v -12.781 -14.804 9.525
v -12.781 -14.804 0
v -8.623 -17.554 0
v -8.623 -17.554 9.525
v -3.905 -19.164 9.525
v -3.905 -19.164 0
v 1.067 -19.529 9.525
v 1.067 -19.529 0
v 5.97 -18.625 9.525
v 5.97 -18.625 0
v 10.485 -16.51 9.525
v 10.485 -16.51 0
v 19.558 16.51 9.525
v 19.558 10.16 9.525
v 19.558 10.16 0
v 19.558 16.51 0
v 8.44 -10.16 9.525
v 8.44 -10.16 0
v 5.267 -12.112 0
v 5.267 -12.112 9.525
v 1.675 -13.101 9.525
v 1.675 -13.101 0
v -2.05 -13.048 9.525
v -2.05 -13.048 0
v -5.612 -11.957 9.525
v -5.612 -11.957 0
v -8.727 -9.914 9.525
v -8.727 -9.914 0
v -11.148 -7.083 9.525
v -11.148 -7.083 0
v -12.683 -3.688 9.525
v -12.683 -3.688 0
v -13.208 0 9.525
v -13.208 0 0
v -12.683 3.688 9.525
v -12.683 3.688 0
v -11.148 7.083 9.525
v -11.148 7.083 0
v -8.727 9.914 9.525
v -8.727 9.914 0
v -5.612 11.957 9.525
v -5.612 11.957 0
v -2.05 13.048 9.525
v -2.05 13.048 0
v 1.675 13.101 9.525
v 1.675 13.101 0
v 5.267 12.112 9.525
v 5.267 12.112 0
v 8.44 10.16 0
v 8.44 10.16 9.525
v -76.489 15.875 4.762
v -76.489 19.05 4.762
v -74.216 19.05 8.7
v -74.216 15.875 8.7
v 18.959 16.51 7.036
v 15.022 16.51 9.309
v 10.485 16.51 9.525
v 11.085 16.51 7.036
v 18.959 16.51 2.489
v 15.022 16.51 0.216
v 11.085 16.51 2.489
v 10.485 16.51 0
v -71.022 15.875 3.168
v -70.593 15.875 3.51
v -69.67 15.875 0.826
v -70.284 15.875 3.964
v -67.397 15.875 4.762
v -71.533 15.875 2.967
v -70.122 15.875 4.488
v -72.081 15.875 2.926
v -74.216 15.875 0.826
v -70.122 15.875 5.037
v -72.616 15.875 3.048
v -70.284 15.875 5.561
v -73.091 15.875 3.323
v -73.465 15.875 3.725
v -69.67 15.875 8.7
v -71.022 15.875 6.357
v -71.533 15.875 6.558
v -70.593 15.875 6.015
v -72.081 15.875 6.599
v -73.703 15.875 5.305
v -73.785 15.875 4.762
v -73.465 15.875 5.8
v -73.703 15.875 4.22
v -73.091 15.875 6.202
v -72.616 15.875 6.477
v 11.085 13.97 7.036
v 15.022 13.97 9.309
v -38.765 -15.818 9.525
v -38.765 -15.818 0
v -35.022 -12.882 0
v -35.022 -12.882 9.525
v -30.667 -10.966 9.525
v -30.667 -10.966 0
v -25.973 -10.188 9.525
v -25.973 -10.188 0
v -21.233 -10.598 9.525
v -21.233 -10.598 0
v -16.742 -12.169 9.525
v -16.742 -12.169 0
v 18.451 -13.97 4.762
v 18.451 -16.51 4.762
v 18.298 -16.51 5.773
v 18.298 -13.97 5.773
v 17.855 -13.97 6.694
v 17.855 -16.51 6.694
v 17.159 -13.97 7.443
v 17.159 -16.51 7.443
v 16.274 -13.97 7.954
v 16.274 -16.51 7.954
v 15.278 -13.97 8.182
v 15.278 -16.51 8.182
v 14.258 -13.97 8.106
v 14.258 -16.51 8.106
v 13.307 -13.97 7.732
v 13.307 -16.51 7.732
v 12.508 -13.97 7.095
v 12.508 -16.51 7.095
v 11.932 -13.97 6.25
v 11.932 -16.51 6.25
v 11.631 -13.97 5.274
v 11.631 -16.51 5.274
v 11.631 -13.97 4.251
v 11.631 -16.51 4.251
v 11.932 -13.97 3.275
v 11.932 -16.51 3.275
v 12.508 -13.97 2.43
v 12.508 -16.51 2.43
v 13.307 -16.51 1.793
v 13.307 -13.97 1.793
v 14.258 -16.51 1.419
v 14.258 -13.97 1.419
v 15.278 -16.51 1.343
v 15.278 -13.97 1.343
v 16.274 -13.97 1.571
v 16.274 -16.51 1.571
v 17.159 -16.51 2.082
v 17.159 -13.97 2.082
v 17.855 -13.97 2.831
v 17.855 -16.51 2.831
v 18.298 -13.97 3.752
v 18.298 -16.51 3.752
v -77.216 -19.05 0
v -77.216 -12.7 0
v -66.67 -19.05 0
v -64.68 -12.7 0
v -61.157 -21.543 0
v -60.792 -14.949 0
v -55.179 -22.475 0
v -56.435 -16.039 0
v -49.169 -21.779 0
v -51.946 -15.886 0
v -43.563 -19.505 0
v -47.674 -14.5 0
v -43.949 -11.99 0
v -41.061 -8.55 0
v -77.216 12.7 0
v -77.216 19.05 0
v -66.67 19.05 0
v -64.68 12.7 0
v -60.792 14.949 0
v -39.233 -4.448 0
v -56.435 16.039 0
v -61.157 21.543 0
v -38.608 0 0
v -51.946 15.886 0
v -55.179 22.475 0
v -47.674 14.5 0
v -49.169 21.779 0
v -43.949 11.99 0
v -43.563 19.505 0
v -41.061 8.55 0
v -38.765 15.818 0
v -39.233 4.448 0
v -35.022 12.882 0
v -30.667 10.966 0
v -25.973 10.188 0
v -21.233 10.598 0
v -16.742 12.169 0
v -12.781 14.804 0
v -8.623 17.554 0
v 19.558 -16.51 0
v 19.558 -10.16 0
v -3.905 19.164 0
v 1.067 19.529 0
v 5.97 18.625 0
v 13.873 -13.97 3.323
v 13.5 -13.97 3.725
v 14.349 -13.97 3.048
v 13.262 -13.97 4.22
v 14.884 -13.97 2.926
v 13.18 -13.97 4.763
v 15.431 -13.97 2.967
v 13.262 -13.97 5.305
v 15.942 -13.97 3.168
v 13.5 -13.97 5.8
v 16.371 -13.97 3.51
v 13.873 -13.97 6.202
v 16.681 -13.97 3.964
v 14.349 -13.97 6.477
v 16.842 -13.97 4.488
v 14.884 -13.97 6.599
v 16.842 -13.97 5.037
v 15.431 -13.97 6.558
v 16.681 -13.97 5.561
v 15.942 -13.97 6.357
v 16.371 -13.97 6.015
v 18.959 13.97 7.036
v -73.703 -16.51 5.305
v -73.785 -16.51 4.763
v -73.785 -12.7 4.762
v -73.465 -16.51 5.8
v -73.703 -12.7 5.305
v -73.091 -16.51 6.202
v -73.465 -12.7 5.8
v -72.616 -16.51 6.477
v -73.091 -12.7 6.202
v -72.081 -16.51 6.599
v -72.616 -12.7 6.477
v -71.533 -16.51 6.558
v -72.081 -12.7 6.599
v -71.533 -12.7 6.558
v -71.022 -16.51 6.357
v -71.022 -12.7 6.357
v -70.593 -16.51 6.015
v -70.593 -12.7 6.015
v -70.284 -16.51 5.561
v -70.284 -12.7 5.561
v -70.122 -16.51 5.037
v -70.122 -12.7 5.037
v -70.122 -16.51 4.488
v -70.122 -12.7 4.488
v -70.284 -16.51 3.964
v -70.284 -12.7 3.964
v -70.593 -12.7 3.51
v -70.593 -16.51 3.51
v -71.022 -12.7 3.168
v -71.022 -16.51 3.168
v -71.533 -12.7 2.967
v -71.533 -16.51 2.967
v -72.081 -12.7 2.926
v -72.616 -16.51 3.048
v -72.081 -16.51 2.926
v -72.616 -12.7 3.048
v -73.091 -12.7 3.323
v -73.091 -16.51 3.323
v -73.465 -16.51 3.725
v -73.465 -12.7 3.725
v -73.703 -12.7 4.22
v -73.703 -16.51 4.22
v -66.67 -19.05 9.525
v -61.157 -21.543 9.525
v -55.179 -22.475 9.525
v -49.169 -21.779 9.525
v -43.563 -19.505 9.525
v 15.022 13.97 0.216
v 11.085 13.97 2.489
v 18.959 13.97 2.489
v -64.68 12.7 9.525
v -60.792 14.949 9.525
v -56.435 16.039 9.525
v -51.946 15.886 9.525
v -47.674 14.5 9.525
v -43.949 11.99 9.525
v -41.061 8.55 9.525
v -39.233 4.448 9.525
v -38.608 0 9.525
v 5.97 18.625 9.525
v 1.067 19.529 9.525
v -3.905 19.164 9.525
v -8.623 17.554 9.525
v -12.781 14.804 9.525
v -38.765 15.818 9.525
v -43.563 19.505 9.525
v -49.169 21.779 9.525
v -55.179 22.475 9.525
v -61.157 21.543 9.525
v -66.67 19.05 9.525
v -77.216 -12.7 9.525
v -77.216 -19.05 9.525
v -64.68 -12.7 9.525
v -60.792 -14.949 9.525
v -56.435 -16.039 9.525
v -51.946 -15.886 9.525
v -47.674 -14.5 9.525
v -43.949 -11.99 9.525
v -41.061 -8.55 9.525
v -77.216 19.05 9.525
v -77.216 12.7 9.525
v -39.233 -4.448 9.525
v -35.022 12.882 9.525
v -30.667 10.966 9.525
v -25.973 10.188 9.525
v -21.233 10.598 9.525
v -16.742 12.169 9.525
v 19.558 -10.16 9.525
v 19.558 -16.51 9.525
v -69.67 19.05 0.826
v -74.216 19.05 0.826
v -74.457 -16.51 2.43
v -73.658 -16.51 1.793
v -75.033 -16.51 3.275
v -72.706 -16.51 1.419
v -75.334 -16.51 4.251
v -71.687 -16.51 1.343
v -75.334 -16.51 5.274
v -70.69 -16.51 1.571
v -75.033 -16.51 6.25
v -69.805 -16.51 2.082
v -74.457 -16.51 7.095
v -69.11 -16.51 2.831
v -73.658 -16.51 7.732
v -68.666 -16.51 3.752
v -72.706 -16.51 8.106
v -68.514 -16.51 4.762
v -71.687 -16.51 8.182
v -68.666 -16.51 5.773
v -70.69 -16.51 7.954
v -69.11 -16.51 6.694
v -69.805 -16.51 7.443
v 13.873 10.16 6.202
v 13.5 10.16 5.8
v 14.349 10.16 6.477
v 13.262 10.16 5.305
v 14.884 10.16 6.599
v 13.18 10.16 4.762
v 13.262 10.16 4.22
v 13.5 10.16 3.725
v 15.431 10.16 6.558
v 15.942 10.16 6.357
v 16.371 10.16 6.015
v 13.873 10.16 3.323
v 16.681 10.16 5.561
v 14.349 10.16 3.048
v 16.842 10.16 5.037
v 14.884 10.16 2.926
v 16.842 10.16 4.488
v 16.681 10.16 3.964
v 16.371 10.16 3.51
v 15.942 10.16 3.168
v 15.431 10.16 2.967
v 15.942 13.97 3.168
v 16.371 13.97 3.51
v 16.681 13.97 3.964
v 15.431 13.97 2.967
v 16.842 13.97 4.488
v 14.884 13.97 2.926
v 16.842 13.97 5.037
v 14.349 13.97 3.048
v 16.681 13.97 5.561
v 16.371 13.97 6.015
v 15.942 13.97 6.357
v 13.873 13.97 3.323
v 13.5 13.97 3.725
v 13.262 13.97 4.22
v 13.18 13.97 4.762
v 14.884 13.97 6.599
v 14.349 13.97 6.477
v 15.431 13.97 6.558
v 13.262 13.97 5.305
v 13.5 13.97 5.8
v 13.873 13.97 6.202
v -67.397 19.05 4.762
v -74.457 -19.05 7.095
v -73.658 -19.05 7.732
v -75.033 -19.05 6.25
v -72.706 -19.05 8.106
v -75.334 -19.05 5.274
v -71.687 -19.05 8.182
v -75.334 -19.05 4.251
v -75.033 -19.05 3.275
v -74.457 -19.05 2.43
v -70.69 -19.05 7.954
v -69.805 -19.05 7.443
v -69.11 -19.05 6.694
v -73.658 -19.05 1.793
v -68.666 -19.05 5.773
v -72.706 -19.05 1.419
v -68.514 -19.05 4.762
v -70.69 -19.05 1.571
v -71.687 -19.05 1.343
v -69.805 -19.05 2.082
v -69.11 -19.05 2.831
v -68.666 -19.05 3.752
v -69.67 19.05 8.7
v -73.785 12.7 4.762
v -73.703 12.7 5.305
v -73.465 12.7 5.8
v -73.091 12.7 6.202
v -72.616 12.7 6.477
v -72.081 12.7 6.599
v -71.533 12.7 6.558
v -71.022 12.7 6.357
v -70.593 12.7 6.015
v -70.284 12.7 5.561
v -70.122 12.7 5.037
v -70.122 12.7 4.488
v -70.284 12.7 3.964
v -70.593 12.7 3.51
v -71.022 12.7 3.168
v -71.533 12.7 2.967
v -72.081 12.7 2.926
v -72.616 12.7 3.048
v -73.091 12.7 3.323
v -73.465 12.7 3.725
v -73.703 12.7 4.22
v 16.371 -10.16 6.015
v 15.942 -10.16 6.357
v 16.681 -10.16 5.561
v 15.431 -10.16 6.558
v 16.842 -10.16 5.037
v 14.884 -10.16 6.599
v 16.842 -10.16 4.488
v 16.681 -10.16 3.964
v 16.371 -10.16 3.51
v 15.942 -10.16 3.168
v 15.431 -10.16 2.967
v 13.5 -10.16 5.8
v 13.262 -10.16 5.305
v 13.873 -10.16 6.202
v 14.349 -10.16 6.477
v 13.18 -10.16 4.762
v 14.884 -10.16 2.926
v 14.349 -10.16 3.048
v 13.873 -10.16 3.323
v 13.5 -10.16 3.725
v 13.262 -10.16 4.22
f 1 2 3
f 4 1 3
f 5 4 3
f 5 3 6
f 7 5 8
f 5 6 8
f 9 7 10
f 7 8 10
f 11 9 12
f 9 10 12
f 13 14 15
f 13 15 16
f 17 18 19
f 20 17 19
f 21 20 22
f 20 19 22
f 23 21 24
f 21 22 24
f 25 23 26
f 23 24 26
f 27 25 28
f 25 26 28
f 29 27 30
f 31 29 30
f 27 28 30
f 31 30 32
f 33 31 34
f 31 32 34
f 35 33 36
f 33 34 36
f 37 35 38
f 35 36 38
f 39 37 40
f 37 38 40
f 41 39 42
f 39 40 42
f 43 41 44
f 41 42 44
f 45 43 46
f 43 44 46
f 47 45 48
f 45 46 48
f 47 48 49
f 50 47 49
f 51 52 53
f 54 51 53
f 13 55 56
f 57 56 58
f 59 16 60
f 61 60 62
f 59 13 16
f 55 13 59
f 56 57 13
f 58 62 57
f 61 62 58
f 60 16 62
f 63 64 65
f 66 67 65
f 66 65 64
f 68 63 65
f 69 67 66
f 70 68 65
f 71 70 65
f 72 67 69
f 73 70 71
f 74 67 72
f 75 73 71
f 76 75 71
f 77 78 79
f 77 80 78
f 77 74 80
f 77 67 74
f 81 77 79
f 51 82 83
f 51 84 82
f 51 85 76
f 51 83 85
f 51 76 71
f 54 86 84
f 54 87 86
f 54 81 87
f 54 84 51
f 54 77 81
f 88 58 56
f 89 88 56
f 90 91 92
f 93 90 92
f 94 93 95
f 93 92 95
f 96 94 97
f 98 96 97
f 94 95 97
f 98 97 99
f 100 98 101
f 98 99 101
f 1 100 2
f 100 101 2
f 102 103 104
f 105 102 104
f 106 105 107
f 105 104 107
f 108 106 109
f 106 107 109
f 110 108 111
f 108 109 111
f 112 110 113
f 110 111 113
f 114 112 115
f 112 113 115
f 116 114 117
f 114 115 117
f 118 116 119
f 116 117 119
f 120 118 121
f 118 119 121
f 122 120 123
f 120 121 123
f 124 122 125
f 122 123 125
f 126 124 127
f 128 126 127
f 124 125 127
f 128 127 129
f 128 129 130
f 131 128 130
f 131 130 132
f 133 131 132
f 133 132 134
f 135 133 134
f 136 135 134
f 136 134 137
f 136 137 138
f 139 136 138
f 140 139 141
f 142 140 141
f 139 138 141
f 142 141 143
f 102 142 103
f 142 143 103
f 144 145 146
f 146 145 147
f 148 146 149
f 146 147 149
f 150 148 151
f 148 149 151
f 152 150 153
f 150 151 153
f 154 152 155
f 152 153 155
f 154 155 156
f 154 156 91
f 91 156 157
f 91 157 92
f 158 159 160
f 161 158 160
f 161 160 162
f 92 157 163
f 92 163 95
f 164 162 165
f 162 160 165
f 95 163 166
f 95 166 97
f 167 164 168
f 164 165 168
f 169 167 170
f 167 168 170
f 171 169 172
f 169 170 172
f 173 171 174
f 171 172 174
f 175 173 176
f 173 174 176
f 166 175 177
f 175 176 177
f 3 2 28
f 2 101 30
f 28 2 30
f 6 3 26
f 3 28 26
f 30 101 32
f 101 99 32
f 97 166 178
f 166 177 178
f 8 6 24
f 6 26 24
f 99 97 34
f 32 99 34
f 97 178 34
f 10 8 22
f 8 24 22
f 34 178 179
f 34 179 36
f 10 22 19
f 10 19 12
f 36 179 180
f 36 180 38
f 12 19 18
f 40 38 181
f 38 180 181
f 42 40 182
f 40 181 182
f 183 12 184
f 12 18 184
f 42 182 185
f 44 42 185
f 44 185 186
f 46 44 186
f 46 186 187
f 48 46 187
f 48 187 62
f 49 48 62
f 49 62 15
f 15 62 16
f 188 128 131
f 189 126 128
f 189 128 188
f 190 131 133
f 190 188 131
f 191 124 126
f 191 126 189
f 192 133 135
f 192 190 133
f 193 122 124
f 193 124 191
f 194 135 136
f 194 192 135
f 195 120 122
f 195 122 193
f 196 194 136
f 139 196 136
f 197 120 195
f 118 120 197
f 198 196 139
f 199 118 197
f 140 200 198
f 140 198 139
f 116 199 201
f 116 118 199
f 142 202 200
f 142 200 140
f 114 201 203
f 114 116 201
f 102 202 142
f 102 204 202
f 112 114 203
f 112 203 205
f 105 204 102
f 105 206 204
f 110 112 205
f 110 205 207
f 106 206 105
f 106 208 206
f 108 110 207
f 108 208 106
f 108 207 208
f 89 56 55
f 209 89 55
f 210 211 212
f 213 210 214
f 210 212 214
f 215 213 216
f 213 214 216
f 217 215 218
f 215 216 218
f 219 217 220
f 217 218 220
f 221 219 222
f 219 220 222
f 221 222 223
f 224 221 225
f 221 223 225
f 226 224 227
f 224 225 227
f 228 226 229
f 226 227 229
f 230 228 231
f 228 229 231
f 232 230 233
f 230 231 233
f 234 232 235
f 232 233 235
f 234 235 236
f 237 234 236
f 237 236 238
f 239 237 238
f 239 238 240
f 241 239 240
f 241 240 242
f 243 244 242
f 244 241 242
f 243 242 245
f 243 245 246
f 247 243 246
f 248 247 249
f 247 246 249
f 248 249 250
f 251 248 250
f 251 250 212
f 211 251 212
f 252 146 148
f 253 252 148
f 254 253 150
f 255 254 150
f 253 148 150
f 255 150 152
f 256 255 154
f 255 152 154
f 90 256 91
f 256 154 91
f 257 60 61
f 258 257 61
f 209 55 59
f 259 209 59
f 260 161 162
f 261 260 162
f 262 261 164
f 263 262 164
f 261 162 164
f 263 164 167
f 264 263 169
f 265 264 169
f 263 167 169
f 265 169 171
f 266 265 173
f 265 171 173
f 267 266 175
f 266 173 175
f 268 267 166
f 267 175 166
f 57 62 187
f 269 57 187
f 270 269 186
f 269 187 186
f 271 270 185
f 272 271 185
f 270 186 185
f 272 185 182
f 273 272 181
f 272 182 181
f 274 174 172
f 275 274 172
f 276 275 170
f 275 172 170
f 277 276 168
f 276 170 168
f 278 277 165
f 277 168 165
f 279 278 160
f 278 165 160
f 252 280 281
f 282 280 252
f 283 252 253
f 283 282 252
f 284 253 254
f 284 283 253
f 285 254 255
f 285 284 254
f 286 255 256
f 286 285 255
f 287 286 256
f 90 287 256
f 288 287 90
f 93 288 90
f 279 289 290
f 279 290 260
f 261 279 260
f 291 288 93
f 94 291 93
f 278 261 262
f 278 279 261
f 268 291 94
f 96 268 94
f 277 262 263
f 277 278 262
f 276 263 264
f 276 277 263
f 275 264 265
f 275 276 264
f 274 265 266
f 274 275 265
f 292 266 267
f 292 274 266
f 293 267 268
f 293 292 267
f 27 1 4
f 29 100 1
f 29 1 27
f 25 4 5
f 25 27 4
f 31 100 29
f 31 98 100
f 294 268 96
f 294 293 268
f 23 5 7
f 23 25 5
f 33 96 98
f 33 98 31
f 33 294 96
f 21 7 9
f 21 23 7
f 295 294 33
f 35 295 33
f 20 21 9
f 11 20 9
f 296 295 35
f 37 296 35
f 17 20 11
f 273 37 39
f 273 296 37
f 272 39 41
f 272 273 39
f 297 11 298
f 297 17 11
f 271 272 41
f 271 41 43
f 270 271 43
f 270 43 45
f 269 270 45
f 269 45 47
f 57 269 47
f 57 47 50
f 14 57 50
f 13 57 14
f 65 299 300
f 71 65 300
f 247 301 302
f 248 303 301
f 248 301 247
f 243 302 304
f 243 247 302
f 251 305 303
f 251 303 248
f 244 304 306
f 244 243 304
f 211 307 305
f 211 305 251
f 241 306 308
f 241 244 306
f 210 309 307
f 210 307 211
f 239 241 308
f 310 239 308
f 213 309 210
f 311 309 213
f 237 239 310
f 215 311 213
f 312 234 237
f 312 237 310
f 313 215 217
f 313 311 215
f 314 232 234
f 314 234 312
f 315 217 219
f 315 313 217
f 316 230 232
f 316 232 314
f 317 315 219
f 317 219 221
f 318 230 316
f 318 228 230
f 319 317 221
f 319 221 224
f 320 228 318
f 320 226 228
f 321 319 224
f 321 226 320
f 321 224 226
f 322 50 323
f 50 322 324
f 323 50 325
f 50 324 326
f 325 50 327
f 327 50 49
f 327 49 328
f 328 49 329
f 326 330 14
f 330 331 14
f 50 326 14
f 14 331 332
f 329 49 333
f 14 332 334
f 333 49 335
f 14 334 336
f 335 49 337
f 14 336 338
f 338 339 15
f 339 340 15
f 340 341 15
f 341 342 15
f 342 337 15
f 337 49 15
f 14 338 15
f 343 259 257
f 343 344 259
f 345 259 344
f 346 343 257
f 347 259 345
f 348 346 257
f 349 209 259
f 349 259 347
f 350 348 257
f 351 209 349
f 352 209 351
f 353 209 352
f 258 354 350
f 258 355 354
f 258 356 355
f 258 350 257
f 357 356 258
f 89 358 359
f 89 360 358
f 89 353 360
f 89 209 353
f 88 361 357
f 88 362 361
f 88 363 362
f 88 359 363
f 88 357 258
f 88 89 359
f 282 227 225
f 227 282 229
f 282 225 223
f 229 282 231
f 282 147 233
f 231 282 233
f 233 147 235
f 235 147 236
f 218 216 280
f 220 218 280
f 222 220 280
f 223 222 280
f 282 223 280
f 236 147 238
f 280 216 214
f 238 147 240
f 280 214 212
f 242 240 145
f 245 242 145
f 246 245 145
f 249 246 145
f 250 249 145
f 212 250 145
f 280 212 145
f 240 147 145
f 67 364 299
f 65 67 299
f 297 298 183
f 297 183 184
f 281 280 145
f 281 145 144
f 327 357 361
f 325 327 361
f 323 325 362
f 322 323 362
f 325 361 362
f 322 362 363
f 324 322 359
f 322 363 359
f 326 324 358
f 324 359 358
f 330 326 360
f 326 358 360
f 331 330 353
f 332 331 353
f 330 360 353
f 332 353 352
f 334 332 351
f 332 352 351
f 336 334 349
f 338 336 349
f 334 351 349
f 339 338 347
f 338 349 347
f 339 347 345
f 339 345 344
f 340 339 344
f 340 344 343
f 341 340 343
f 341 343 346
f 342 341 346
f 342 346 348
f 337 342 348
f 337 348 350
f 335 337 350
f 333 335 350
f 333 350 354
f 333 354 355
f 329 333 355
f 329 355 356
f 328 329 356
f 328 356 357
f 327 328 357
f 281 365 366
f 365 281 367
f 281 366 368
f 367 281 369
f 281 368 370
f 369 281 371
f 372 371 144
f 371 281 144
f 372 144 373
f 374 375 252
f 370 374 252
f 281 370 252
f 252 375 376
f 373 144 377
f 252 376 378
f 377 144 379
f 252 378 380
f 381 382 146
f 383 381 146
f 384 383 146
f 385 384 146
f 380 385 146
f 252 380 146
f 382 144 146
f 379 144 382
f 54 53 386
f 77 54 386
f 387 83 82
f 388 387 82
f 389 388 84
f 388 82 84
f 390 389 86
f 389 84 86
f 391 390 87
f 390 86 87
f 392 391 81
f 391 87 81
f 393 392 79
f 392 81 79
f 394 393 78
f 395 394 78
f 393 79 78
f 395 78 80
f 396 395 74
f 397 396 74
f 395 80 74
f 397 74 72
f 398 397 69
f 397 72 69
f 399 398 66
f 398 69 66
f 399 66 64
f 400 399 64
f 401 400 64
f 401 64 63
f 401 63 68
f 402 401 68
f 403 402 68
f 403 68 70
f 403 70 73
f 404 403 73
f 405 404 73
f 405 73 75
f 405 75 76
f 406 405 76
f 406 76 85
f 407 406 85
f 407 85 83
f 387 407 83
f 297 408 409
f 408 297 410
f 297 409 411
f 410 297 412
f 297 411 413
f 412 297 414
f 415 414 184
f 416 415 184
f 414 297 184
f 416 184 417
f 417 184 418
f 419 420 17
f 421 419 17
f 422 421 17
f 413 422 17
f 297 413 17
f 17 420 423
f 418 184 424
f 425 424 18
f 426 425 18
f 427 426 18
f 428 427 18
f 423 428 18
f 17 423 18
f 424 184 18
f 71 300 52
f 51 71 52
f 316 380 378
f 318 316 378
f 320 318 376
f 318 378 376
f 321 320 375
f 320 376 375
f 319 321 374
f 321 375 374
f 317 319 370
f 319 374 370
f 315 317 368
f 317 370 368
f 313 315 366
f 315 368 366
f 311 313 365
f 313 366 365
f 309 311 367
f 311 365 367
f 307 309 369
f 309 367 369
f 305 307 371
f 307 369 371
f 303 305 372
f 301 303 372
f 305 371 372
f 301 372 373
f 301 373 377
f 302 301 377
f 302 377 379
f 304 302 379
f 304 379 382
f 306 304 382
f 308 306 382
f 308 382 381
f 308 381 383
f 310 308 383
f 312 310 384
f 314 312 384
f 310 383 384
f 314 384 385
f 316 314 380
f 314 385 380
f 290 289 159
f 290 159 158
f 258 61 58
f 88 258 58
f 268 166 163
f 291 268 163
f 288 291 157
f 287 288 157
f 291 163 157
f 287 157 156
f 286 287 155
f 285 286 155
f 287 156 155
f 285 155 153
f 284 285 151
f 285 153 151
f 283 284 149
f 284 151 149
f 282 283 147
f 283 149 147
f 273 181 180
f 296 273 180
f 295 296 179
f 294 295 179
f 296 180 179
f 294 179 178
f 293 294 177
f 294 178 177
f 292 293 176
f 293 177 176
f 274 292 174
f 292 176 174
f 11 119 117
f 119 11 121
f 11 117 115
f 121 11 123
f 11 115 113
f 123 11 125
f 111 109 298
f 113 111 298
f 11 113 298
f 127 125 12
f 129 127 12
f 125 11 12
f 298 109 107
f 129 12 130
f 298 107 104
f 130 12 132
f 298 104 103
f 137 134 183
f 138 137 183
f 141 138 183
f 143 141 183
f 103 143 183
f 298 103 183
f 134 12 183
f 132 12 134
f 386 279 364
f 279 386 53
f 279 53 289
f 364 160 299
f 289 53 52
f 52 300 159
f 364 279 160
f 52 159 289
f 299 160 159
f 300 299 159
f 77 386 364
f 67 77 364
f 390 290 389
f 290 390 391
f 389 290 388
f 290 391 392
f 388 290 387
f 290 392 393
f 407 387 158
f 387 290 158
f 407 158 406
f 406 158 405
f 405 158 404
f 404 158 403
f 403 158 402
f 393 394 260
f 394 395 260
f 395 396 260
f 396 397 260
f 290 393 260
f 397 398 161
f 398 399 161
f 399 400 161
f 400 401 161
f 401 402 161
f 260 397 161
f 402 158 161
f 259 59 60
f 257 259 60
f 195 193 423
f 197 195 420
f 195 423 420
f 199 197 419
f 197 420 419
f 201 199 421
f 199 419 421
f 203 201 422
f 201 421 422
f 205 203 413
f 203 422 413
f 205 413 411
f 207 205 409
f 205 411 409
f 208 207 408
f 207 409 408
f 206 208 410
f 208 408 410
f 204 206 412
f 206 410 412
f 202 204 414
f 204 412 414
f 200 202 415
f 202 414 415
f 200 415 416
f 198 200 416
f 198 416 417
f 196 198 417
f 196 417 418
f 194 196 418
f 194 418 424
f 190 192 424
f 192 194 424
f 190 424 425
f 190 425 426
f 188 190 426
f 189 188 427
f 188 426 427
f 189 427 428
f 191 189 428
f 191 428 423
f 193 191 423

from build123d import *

# Parameters (mm, degrees)
F1_DEPTH = 9.525
F2_R     = 1.8415
F3_DEPTH = 41.53
F4_DEPTH = 3.175
F5_DEPTH = 5.08
F6_R     = 3.429
F6_R_2   = 1.8415
F7_DEPTH = 2.54
F8_R     = 3.429
F8_R_2   = 1.8415
F9_DEPTH = 2.54


with BuildPart() as f1:
    # F0 (on Top) → F1 (new body)
    with BuildSketch(Plane.XY):
        with BuildLine():
            ThreePointArc((-32.258, 0), (-33.9484276618, 8.5522336929), (-38.7654692948, 15.8182062173))
            ThreePointArc((-38.7654692948, 15.8182062173), (-52.1508813913, 22.3297432037), (-66.6702703397, 19.05))
            ThreePointArc((-66.6702703397, 19.05), (-70.3046684409, 16.2158299298), (-73.2846532478, 12.7))
            Line((-73.2846532478, 12.7), (-64.6795671232, 12.7))
            ThreePointArc((-64.6795671232, 12.7), (-47.6736801053, 14.5001432084), (-38.608, 0))
            ThreePointArc((-38.608, 0), (-47.6736801053, -14.5001432084), (-64.6795671232, -12.7))
            Line((-64.6795671232, -12.7), (-73.2846532478, -12.7))
            ThreePointArc((-73.2846532478, -12.7), (-70.3046684409, -16.2158299298), (-66.6702703397, -19.05))
            ThreePointArc((-66.6702703397, -19.05), (-52.1508813913, -22.3297432037), (-38.7654692948, -15.8182062173))
            ThreePointArc((-38.7654692948, -15.8182062173), (-33.9484276618, -8.5522336929), (-32.258, 0))
        make_face()
        with BuildLine():
            ThreePointArc((-73.2846532478, 12.7), (-70.3046684409, 16.2158299298), (-66.6702703397, 19.05))
            Line((-66.6702703397, 19.05), (-77.216, 19.05))
            Line((-77.216, 19.05), (-77.216, 12.7))
            Line((-77.216, 12.7), (-73.2846532478, 12.7))
        make_face()
        with BuildLine():
            Line((-77.216, -19.05), (-66.6702703397, -19.05))
            ThreePointArc((-66.6702703397, -19.05), (-70.3046684409, -16.2158299298), (-73.2846532478, -12.7))
            Line((-73.2846532478, -12.7), (-77.216, -12.7))
            Line((-77.216, -12.7), (-77.216, -19.05))
        make_face()
        with BuildLine():
            ThreePointArc((-12.7811255343, -14.8039925046), (-19.558, 0), (-12.7811255343, 14.8039925046))
            ThreePointArc((-12.7811255343, 14.8039925046), (-25.9732623614, 10.1879602673), (-38.7654692948, 15.8182062173))
            ThreePointArc((-38.7654692948, 15.8182062173), (-33.9484276618, 8.5522336929), (-32.258, 0))
            ThreePointArc((-32.258, 0), (-33.9484276618, -8.5522336929), (-38.7654692948, -15.8182062173))
            ThreePointArc((-38.7654692948, -15.8182062173), (-25.9732623614, -10.1879602673), (-12.7811255343, -14.8039925046))
        make_face()
        with BuildLine():
            ThreePointArc((8.4395298447, -10.16), (-13.208, 0), (8.4395298447, 10.16))
            Line((8.4395298447, 10.16), (16.711964696, 10.16))
            ThreePointArc((16.711964696, 10.16), (13.9642175742, 13.6936478537), (10.4850018598, 16.51))
            ThreePointArc((10.4850018598, 16.51), (-1.4302661905, 19.5056325871), (-12.7811255343, 14.8039925046))
            ThreePointArc((-12.7811255343, 14.8039925046), (-19.558, 0), (-12.7811255343, -14.8039925046))
            ThreePointArc((-12.7811255343, -14.8039925046), (-1.4302661905, -19.5056325871), (10.4850018598, -16.51))
            ThreePointArc((10.4850018598, -16.51), (13.9642175742, -13.6936478537), (16.711964696, -10.16))
            Line((16.711964696, -10.16), (8.4395298447, -10.16))
        make_face()
        with BuildLine():
            Line((19.558, -10.16), (16.711964696, -10.16))
            ThreePointArc((16.711964696, -10.16), (13.9642175742, -13.6936478537), (10.4850018598, -16.51))
            Line((10.4850018598, -16.51), (19.558, -16.51))
            Line((19.558, -16.51), (19.558, -10.16))
        make_face()
        with BuildLine():
            ThreePointArc((10.4850018598, 16.51), (13.9642175742, 13.6936478537), (16.711964696, 10.16))
            Line((16.711964696, 10.16), (19.558, 10.16))
            Line((19.558, 10.16), (19.558, 16.51))
            Line((19.558, 16.51), (10.4850018598, 16.51))
        make_face()
    extrude(amount=F1_DEPTH)

    # F2 (on face) → F3 (cut, through all)
    with BuildSketch(Plane(origin=(0, 19.05, 0), x_dir=(-1, 0, 0), z_dir=(0, 1, 0))):
        with Locations((71.9431351698, 4.7625)):
            Circle(F2_R)
        with Locations((-15.0215009299, 4.7625)):
            Circle(F2_R)
    extrude(amount=-F3_DEPTH, mode=Mode.SUBTRACT)

    # F2 (on face) → F4 (cut)
    with BuildSketch(Plane(origin=(0, 19.05, 0), x_dir=(-1, 0, 0), z_dir=(0, 1, 0))):
        Polygon((69.67010716, 8.6995), (67.3970791502, 4.7625), (69.67010716, 0.8255), (74.2161631796, 0.8255), (76.4891911894, 4.7625), (74.2161631796, 8.6995), align=None)
        with Locations((71.9431351698, 4.7625)):
            Circle(F2_R, mode=Mode.SUBTRACT)
    extrude(amount=-F4_DEPTH, mode=Mode.SUBTRACT)

    # F2 (on face) → F5 (cut)
    with BuildSketch(Plane(origin=(0, 19.05, 0), x_dir=(-1, 0, 0), z_dir=(0, 1, 0))):
        Polygon((-18.9585009299, 7.0355280098), (-18.9585009299, 2.4894719902), (-15.0215009299, 0.2164439804), (-11.0845009299, 2.4894719902), (-11.0845009299, 7.0355280098), (-15.0215009299, 9.3085560196), align=None)
        with Locations((-15.0215009299, 4.7625)):
            Circle(F2_R, mode=Mode.SUBTRACT)
    extrude(amount=-F5_DEPTH, mode=Mode.SUBTRACT)

    # F6 (on face) → F7 (cut)
    with BuildSketch(Plane.XZ.offset(16.51)):
        with Locations((15.0215009299, 4.7625)):
            Circle(F6_R)
        with Locations((15.0215009299, 4.7625)):
            Circle(F6_R_2, mode=Mode.SUBTRACT)
    extrude(amount=-F7_DEPTH, mode=Mode.SUBTRACT)

    # F8 (on face) → F9 (cut)
    with BuildSketch(Plane.XZ.offset(19.05)):
        with Locations((-71.9431351698, 4.7625)):
            Circle(F8_R)
        with Locations((-71.9431351698, 4.7625)):
            Circle(F8_R_2, mode=Mode.SUBTRACT)
    extrude(amount=-F9_DEPTH, mode=Mode.SUBTRACT)


solid = f1.part
